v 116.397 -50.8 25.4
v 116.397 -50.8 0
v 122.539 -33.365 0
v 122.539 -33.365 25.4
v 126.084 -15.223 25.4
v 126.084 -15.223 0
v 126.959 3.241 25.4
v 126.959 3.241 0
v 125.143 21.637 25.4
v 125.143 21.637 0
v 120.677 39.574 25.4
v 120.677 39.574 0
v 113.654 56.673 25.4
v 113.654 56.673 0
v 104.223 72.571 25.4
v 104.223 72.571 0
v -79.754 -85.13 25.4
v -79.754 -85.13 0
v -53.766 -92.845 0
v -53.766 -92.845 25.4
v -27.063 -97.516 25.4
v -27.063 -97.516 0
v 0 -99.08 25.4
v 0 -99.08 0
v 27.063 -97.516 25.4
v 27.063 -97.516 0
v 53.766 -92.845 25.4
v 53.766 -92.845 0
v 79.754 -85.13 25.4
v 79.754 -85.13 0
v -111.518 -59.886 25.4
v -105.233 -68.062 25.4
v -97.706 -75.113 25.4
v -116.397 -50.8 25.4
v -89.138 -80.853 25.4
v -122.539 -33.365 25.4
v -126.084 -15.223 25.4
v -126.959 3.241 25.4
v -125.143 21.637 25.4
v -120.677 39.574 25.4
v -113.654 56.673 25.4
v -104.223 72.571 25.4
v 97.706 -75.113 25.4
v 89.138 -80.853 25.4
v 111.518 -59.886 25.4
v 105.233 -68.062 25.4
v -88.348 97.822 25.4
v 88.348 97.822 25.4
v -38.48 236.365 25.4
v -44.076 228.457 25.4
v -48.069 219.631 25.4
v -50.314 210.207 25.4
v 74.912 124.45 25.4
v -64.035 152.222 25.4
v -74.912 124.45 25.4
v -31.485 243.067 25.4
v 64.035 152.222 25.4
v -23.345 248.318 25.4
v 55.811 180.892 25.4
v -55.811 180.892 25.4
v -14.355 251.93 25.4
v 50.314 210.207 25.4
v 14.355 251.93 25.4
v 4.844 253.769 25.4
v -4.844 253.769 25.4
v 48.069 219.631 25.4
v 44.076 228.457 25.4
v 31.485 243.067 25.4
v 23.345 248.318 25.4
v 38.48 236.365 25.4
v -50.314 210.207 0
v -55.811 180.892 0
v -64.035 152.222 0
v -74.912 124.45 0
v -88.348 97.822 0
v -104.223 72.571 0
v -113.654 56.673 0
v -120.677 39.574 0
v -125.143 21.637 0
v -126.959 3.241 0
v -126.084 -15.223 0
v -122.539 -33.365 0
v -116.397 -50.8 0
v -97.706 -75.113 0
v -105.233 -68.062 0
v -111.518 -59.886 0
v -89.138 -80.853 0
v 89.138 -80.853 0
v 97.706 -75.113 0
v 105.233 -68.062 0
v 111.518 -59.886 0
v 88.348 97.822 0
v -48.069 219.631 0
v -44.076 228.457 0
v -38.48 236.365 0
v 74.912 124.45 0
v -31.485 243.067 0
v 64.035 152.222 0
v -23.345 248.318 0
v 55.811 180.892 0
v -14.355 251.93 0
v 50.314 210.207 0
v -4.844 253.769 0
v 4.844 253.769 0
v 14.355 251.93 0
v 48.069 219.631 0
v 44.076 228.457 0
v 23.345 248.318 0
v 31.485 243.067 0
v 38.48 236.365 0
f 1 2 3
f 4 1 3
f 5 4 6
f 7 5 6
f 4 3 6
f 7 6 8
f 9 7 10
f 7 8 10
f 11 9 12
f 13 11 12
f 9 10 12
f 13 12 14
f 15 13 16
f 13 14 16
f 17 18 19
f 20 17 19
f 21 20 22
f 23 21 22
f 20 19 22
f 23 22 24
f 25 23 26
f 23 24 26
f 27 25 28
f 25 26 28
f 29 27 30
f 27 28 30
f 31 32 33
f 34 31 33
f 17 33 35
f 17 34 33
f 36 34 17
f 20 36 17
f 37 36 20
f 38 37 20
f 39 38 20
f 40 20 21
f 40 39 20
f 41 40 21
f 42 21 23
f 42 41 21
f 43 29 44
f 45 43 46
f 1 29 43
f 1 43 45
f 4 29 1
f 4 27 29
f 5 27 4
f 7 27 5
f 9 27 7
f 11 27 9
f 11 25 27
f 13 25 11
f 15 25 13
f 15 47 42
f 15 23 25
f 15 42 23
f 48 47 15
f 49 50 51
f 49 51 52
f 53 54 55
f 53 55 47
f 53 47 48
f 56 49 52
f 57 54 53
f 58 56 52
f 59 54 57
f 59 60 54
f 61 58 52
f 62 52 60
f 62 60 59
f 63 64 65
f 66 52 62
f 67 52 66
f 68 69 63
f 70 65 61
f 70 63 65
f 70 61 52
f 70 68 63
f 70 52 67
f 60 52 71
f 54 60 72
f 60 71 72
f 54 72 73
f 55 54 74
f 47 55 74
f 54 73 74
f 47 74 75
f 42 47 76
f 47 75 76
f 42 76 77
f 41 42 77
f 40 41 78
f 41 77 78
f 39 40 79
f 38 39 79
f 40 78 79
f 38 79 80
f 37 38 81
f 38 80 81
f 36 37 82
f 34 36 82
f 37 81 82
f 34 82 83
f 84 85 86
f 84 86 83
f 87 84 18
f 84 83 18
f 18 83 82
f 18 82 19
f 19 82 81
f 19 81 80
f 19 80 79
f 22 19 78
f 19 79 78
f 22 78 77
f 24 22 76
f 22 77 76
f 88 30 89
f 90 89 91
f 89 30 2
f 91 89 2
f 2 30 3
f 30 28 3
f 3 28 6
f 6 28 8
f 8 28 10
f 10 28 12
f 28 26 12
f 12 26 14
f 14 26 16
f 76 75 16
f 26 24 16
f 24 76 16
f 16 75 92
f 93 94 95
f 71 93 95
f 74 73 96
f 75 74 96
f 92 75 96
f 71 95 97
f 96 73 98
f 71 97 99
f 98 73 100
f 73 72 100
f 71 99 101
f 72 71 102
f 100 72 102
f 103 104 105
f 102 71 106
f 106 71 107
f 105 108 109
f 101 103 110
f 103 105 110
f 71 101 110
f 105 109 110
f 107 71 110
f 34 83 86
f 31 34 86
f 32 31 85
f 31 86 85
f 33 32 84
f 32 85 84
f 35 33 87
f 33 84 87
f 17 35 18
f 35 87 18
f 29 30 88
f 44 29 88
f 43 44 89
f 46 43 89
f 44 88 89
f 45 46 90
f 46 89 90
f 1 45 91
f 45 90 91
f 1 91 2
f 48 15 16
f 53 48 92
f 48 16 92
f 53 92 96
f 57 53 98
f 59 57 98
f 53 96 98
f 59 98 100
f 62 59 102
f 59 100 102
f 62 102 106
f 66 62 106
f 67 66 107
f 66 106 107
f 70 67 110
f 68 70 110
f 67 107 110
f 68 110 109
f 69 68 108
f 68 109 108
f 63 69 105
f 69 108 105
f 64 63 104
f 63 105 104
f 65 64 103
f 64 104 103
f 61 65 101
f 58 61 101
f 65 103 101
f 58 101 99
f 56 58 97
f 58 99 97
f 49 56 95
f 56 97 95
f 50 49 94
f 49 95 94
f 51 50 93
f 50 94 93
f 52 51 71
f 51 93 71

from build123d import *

# Parameters (mm, degrees)
F1_DEPTH = 25.4


with BuildPart() as f1:
    # F0 (on Top) → F1 (new body)
    with BuildSketch(Plane.XY):
        with BuildLine():
            ThreePointArc((116.3974231574, -50.7999988418), (124.3211018713, -25.94732413), (127, 0))
            ThreePointArc((127, 0), (121.171970747, 38.0309545671), (104.2227794443, 72.5714285714))
            ThreePointArc((104.2227794443, 72.5714285714), (0, 127), (-104.2227794443, 72.5714285714))
            ThreePointArc((-104.2227794443, 72.5714285714), (-126.3860979139, 12.4721391145), (-116.3974224673, -50.8000004228))
            ThreePointArc((-116.3974224673, -50.8000004228), (-83.5987115374, 32.7987112337), (0, 0))
            ThreePointArc((0, 0), (71.1723737002, 36.7605508711), (121.6987113259, -25.4))
            ThreePointArc((121.6987113259, -25.4), (120.3592623261, -38.3736617557), (116.3974231574, -50.7999988418))
        make_face()
        with BuildLine():
            ThreePointArc((0, 0), (-83.5987115374, 32.7987112337), (-116.3974224673, -50.8000004228))
            ThreePointArc((-116.3974224673, -50.8000004228), (-101.6129668627, -71.7406130321), (-79.7537895948, -85.1296291703))
            ThreePointArc((-79.7537895948, -85.1296291703), (-33.0925403585, -83.7260677515), (0, -50.8))
            ThreePointArc((0, -50.8), (-5.3012886741, -25.4), (0, 0))
        make_face()
        with BuildLine():
            ThreePointArc((5.3012886741, -25.4), (3.9618395452, -12.4263376257), (0, 0))
            ThreePointArc((0, 0), (-5.3012886741, -25.4), (0, -50.8))
            ThreePointArc((0, -50.8), (3.9618395452, -38.3736623743), (5.3012886741, -25.4))
        make_face()
        with BuildLine():
            ThreePointArc((79.7537895948, -85.1296291703), (101.6129674921, -71.7406124424), (116.3974231574, -50.7999988418))
            ThreePointArc((116.3974231574, -50.7999988418), (120.3592623261, -38.3736617557), (121.6987113259, -25.4))
            ThreePointArc((121.6987113259, -25.4), (71.1723737002, 36.7605508711), (0, 0))
            ThreePointArc((0, 0), (3.9618395452, -12.4263376257), (5.3012886741, -25.4))
            ThreePointArc((5.3012886741, -25.4), (3.9618395452, -38.3736623743), (0, -50.8))
            ThreePointArc((0, -50.8), (33.0925403585, -83.7260677515), (79.7537895948, -85.1296291703))
        make_face()
        with BuildLine():
            ThreePointArc((-79.7537895948, -85.1296291703), (0, -99.0800012402), (79.7537895948, -85.1296291703))
            ThreePointArc((79.7537895948, -85.1296291703), (33.0925403585, -83.7260677515), (0, -50.8))
            ThreePointArc((0, -50.8), (-33.0925403585, -83.7260677515), (-79.7537895948, -85.1296291703))
        make_face()
        with BuildLine():
            ThreePointArc((-104.2227794443, 72.5714285714), (0, 127), (104.2227794443, 72.5714285714))
            ThreePointArc((104.2227794443, 72.5714285714), (69.1473175054, 138.2082566307), (50.314445249, 210.2068965517))
            ThreePointArc((50.314445249, 210.2068965517), (50.678465933, 206.711850036), (50.8, 203.2))
            ThreePointArc((50.8, 203.2), (-3.511850036, 152.521534067), (-50.314445249, 210.2068965517))
            ThreePointArc((-50.314445249, 210.2068965517), (-69.1473175054, 138.2082566307), (-104.2227794443, 72.5714285714))
        make_face()
        with BuildLine():
            ThreePointArc((50.8, 203.2), (50.678465933, 206.711850036), (50.314445249, 210.2068965517))
            ThreePointArc((50.314445249, 210.2068965517), (0, 254), (-50.314445249, 210.2068965517))
            ThreePointArc((-50.314445249, 210.2068965517), (-3.511850036, 152.521534067), (50.8, 203.2))
        make_face()
    extrude(amount=F1_DEPTH)


solid = f1.part
